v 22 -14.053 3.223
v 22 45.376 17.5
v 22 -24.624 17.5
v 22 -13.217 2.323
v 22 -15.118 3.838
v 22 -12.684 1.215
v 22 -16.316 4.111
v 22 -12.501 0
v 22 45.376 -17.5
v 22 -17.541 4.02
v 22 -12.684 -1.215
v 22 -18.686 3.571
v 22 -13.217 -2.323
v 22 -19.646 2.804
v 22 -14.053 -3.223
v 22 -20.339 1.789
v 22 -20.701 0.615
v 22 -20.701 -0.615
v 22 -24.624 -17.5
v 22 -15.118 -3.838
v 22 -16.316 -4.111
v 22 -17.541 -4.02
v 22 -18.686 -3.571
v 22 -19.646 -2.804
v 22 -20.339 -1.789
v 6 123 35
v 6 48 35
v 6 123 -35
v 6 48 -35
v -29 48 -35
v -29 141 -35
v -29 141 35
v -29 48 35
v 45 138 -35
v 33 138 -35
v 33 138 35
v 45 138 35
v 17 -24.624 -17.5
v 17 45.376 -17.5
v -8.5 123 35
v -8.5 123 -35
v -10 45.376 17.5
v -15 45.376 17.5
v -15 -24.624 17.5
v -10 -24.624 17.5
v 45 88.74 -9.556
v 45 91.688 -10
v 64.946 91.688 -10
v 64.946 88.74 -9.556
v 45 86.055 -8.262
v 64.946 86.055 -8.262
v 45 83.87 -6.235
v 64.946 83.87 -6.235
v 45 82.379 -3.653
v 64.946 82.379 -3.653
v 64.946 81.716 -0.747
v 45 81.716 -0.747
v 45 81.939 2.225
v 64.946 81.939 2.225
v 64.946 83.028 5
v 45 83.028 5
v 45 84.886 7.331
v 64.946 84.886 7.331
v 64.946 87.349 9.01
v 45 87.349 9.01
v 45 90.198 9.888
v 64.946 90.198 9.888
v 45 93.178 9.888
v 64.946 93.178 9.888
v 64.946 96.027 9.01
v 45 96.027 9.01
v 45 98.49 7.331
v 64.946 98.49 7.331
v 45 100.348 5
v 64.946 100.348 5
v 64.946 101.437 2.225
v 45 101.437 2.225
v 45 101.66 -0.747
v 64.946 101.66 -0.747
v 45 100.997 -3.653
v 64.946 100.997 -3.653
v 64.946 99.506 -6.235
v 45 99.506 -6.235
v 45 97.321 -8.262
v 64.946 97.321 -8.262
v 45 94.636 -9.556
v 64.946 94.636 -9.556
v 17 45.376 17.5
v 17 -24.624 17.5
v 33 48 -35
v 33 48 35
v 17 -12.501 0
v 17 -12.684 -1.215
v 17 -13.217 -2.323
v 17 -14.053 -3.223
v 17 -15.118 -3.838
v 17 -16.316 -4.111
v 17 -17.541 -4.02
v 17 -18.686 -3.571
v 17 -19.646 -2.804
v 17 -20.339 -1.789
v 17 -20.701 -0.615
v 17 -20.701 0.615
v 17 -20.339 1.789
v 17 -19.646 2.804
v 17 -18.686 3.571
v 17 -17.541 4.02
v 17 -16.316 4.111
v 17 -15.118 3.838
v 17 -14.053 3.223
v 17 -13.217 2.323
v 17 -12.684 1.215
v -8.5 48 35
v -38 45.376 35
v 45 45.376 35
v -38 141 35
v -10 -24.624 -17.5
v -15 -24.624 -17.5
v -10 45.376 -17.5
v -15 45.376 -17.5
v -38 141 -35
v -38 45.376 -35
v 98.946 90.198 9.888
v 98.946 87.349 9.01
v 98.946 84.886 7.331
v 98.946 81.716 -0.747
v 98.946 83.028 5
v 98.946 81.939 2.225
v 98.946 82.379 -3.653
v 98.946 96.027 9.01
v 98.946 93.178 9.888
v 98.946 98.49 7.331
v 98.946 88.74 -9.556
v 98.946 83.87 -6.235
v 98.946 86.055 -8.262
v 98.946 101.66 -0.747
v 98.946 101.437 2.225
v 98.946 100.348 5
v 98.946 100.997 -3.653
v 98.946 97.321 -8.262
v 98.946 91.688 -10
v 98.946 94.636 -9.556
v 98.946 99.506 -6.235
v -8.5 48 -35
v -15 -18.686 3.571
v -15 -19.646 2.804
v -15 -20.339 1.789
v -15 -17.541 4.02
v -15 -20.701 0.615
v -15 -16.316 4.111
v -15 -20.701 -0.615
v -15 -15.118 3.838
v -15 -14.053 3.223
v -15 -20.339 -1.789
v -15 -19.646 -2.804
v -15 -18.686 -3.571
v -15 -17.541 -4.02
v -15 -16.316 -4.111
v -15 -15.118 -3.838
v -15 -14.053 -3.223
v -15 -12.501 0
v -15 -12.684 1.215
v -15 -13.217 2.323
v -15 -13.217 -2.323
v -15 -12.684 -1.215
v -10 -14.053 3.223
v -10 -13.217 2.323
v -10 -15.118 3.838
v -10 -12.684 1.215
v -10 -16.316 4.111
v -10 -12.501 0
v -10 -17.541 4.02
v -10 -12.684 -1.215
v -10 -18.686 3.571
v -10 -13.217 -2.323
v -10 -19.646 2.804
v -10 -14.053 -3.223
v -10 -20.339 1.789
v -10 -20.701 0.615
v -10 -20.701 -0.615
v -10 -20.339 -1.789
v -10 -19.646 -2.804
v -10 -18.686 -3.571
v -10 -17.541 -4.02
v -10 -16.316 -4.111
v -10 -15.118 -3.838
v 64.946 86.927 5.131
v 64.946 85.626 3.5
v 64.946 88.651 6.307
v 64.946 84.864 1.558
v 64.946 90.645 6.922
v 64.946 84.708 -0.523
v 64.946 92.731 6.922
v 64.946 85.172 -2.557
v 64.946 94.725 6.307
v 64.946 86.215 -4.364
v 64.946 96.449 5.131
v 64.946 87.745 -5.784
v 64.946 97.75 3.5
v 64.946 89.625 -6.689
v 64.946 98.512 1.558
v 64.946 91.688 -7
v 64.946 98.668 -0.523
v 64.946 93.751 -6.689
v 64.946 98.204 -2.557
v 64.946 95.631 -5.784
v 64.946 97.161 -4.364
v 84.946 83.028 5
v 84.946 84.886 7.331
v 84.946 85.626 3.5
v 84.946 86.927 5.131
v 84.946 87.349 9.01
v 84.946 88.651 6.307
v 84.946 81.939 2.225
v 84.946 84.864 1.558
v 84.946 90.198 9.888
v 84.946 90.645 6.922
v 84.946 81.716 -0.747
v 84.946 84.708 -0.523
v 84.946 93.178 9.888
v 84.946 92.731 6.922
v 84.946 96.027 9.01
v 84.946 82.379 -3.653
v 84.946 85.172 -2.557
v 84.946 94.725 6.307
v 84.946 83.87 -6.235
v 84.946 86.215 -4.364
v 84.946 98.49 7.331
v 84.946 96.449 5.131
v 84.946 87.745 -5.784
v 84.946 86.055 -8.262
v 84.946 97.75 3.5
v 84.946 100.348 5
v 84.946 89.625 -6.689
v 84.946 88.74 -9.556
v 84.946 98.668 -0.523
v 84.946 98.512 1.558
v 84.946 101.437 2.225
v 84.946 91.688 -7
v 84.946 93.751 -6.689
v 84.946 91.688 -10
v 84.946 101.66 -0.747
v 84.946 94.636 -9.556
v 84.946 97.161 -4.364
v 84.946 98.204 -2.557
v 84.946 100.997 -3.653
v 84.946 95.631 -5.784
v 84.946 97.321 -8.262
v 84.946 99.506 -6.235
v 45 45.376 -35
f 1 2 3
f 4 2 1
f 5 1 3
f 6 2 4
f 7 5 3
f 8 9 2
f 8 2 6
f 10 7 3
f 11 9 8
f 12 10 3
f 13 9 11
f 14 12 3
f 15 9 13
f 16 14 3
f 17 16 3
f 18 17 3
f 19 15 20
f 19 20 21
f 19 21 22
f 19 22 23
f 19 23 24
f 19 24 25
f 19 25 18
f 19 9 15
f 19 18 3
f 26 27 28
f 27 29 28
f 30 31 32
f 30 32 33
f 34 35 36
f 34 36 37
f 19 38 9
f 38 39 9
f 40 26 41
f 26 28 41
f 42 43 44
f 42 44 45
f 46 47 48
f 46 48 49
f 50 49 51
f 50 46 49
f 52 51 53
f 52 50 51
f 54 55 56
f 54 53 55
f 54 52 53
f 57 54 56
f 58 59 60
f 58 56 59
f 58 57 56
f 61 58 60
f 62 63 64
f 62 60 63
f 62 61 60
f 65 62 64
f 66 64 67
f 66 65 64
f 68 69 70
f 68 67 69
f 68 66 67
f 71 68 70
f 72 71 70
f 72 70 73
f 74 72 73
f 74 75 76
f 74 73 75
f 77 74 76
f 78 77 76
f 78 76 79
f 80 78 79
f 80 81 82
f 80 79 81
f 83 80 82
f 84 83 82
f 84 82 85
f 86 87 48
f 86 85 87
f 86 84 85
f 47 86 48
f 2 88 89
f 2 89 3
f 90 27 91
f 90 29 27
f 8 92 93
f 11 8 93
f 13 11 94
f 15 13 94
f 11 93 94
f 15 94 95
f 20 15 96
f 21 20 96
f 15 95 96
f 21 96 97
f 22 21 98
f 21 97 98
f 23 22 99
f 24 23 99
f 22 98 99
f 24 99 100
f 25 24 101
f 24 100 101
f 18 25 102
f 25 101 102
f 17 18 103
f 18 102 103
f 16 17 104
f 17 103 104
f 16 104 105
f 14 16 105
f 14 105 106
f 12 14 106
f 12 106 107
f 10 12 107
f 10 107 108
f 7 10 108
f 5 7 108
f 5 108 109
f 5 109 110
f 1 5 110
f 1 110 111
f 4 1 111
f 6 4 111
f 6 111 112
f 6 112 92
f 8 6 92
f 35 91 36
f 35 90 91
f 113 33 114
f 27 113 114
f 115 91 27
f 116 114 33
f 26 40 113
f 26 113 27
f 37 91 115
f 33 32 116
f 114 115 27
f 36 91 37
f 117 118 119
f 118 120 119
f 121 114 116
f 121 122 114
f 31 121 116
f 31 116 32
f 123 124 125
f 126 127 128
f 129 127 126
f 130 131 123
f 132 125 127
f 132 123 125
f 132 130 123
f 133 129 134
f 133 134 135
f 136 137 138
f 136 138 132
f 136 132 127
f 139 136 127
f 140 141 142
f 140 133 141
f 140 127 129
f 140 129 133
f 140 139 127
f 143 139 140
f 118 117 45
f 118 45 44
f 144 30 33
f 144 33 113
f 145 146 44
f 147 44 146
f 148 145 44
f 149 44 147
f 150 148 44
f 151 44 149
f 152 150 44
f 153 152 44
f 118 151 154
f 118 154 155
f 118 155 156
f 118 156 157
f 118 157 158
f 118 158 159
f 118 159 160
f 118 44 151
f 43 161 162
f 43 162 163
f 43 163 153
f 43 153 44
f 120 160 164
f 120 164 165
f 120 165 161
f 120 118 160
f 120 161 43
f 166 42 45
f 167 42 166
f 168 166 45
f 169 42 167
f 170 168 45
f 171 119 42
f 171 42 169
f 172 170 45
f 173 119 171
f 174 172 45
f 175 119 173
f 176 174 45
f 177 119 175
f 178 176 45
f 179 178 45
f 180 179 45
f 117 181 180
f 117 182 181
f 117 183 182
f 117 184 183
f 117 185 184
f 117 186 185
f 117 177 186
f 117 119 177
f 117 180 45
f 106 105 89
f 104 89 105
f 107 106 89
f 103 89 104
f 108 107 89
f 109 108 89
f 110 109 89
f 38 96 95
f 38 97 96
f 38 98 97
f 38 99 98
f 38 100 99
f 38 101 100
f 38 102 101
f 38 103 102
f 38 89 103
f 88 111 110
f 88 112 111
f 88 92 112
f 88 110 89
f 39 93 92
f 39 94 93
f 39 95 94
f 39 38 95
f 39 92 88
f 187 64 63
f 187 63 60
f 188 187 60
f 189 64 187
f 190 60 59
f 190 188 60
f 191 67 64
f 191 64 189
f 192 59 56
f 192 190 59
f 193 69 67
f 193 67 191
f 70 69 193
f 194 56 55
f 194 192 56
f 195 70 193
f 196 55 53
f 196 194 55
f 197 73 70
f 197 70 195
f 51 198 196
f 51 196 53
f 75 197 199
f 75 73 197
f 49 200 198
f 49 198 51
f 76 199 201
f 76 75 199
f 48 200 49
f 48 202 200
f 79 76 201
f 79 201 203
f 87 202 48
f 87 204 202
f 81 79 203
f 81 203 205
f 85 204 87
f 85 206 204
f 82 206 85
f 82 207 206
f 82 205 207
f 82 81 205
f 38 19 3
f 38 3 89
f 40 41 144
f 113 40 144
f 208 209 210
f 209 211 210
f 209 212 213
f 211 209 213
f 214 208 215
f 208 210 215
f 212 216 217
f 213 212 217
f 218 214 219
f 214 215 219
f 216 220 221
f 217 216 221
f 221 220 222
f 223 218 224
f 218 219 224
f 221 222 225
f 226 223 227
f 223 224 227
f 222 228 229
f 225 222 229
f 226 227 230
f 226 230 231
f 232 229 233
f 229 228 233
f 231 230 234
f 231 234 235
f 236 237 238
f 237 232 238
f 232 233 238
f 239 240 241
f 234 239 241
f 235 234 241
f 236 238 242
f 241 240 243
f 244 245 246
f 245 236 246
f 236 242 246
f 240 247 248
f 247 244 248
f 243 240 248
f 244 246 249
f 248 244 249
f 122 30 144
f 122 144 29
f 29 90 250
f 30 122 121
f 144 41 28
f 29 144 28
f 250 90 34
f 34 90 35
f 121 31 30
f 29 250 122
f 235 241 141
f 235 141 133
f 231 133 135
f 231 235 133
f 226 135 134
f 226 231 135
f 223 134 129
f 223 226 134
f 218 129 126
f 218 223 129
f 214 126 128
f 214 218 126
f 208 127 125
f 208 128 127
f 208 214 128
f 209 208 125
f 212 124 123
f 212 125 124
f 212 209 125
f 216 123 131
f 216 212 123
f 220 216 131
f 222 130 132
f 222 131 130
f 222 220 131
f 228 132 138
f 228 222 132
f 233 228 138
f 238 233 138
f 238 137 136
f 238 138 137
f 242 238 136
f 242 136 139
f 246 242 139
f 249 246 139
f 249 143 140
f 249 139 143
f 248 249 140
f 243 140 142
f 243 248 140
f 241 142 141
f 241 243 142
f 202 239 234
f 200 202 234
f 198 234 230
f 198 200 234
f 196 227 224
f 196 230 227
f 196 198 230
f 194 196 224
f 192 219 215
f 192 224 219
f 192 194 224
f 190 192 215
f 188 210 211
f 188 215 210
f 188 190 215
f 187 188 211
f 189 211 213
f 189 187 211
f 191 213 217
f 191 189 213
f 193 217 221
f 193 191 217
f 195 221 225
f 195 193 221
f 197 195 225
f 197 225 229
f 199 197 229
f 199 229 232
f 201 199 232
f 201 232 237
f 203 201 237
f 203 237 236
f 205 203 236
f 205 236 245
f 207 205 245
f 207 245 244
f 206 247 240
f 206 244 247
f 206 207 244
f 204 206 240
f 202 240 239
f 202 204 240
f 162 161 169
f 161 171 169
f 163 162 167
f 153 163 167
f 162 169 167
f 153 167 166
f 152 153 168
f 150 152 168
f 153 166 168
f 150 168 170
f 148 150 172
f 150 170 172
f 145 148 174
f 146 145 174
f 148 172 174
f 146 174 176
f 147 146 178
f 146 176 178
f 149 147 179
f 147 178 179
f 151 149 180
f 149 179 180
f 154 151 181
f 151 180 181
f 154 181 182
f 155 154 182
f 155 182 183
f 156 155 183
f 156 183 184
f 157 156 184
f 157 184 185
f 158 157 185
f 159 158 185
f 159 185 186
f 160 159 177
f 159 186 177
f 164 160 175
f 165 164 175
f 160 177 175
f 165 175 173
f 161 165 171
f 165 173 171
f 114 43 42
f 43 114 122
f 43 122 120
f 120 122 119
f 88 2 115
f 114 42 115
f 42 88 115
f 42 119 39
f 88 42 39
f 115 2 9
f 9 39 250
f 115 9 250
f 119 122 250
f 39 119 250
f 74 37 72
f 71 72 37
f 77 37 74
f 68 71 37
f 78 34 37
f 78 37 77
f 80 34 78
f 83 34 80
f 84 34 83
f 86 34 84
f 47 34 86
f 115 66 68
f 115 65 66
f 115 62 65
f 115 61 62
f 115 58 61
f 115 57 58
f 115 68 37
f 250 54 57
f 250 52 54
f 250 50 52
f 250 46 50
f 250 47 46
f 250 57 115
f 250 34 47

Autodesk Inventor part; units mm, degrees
ref_plane "YZ Plane" through (0, 0, 0) normal (1, 0, 0) x (0, 1, 0)
ref_plane "XZ Plane" through (0, 0, 0) normal (0, 1, 0) x (-1, 0, 0)
ref_plane "XY Plane" through (0, 0, 0) normal (0, 0, 1) x (1, 0, 0)
sketch "Sketch1" plane through (0, 0, 0) normal (0, 0, 1) x (1, 0, 0)
  line L0 (-38, 45.376) -> (-29, 45.376)
  line L1 (-29, 45.376) -> (-29, 48)
  line L2 (-29, 141) -> (-29, 48)
  line L3 (-38, 141) -> (-29, 141)
  line L4 (-38, 45.376) -> (-38, 141)
  line L5 (0, 45.376) -> (45, 45.376)
  line L6 (45, 138) -> (45, 45.376)
  line L7 (33, 138) -> (45, 138)
  line L8 (33, 48) -> (33, 138)
  line L9 (6, 48) -> (33, 48)
  line L10 (6, 48) -> (6, 123)
  line L11 (6, 123) -> (-8.5, 123)
  line L12 (-8.5, 123) -> (-8.5, 48)
  line L13 (0, 48) -> (-8.5, 48)
  line L14 (0, 45.376) -> (0, 48)
  line L15 (0, 48) -> (0, 45.376)
  line L16 (-29, 48) -> (0, 48)
  line L17 (-29, 45.376) -> (-29, 48)
  line L18 (0, 45.376) -> (-29, 45.376)
  point P0 (0, 0)
  point P1 (276, 309.9765)
  dimension "GRIP3_W" = 12
  dimension "GRIP3_MID_THICK" = 14.5
  dimension "GRIP3_LEFT_THICK" = 9
  dimension "GRIP3_H" = 92.624
  dimension "GRIP3_MIDDLE_H" = 75
  dimension "GRIP3_LEFT_H" = 95.624
  dimension "GRIP3_W_ALL" = 83
  dimension "GRIP3_T" = 2.624
  dimension "GRIP3_T_2" = 2.624
extrude "Extrusion1" add sketch "Sketch1" along normal mid plane 70
sketch "Sketch2" plane through (0, 0, 0) normal (0, 0, 1) x (1, 0, 0)
  line L0 (-29, 45.376) -> (45, 45.376) projected
  line L1 (-15, 45.376) -> (-10, 45.376)
  line L2 (-10, 45.376) -> (-10, -24.624)
  line L3 (-10, -24.624) -> (-15, -24.624)
  line L4 (-15, -24.624) -> (-15, 45.376)
  line L5 (17, 45.376) -> (22, 45.376)
  line L6 (22, 45.376) -> (22, -24.624)
  line L7 (22, -24.624) -> (17, -24.624)
  line L8 (17, -24.624) -> (17, 45.376)
  line L9 (45, 45.376) -> (45, 138) projected
  line L10 (-38, 141) -> (-38, 45.376) projected
  point P0 (0, 0)
  point P1 (-10, 45.376)
  point P2 (22, 45.376)
  dimension "GRIP3_MTG" = 70
  dimension "GRIP3_MTG_TH" = 5
  dimension "GRIP3_LOC" = 23
  dimension "d16" = 23
extrude "Extrusion2" add sketch "Sketch2" along normal mid plane 35
sketch "Sketch3" plane through (0, 0, 0) normal (1, 0, 0) x (0, 1, 0)
  circle A0 centre (-16.624, 0) radius 4.123
  line L0 (-24.624, -17.5) -> (-24.624, 17.5) projected
  line L1 (45.376, -17.5) -> (-24.624, -17.5) projected
  point P0 (0, 0)
  dimension "PIN_HOLE_DIAM" = 8.246
  dimension "LOC_PIN_HOLE" = 8
  dimension "LOC_HOLE" = 17.5
extrude "Extrusion3" cut sketch "Sketch3" along normal blind 35 and the other way blind 35
sketch "Sketch4" plane through (45, 45.376, 35) normal (1, 0, 0) x (0, 0, -1)
  circle A0 centre (35, 46.312) radius 10
  line L0 (70, 92.624) -> (70, 0) projected
  line L1 (70, 0) -> (0, 0) projected
  point P0 (35, -45.376)
  dimension "PIN_DIAM1" = 20
  dimension "LOC_PIN" = 35
  dimension "d26" = 46.312
extrude "Extrusion4" add sketch "Sketch4" along normal blind 19.946
sketch "Sketch5" plane through (64.946, 91.688, 0) normal (1, 0, 0) x (0, 0, -1)
  circle A0 centre (0, 0) radius 7
  point P0 (0, -91.688)
  dimension "PIN_DIAME2" = 14
extrude "Extrusion5" add sketch "Sketch5" along normal blind 20
sketch "Sketch6" plane through (84.946, 91.688, 0) normal (1, 0, 0) x (0, 0, -1)
  circle A0 centre (0, 0) radius 10
  point P0 (0, -91.688)
  dimension "PIN_DIAM3" = 20
extrude "Extrusion6" add sketch "Sketch6" along normal blind 14
equation "\"GRIP3_T_2\" = GRIP3_T"
equation "\"d16\" = GRIP3_LOC"
equation "\"LOC_HOLE\" = 0.5 * GRIP3_MTG_EXTR"
equation "\"LOC_PIN\" = 0.5 * GRIP3_EXTR"
equation "\"d26\" = 0.5 * GRIP3_H"
equation "\"PIN_DIAM3\" = PIN_DIAM1"
equation "\"PIN3_H\" = PIN_DIAME2"
equation "\"GRIP3_MTG_EXTR\" = 35"
equation "\"GRIP3_EXTR\" = 70"
properties part number "grip - Copy1-1"
